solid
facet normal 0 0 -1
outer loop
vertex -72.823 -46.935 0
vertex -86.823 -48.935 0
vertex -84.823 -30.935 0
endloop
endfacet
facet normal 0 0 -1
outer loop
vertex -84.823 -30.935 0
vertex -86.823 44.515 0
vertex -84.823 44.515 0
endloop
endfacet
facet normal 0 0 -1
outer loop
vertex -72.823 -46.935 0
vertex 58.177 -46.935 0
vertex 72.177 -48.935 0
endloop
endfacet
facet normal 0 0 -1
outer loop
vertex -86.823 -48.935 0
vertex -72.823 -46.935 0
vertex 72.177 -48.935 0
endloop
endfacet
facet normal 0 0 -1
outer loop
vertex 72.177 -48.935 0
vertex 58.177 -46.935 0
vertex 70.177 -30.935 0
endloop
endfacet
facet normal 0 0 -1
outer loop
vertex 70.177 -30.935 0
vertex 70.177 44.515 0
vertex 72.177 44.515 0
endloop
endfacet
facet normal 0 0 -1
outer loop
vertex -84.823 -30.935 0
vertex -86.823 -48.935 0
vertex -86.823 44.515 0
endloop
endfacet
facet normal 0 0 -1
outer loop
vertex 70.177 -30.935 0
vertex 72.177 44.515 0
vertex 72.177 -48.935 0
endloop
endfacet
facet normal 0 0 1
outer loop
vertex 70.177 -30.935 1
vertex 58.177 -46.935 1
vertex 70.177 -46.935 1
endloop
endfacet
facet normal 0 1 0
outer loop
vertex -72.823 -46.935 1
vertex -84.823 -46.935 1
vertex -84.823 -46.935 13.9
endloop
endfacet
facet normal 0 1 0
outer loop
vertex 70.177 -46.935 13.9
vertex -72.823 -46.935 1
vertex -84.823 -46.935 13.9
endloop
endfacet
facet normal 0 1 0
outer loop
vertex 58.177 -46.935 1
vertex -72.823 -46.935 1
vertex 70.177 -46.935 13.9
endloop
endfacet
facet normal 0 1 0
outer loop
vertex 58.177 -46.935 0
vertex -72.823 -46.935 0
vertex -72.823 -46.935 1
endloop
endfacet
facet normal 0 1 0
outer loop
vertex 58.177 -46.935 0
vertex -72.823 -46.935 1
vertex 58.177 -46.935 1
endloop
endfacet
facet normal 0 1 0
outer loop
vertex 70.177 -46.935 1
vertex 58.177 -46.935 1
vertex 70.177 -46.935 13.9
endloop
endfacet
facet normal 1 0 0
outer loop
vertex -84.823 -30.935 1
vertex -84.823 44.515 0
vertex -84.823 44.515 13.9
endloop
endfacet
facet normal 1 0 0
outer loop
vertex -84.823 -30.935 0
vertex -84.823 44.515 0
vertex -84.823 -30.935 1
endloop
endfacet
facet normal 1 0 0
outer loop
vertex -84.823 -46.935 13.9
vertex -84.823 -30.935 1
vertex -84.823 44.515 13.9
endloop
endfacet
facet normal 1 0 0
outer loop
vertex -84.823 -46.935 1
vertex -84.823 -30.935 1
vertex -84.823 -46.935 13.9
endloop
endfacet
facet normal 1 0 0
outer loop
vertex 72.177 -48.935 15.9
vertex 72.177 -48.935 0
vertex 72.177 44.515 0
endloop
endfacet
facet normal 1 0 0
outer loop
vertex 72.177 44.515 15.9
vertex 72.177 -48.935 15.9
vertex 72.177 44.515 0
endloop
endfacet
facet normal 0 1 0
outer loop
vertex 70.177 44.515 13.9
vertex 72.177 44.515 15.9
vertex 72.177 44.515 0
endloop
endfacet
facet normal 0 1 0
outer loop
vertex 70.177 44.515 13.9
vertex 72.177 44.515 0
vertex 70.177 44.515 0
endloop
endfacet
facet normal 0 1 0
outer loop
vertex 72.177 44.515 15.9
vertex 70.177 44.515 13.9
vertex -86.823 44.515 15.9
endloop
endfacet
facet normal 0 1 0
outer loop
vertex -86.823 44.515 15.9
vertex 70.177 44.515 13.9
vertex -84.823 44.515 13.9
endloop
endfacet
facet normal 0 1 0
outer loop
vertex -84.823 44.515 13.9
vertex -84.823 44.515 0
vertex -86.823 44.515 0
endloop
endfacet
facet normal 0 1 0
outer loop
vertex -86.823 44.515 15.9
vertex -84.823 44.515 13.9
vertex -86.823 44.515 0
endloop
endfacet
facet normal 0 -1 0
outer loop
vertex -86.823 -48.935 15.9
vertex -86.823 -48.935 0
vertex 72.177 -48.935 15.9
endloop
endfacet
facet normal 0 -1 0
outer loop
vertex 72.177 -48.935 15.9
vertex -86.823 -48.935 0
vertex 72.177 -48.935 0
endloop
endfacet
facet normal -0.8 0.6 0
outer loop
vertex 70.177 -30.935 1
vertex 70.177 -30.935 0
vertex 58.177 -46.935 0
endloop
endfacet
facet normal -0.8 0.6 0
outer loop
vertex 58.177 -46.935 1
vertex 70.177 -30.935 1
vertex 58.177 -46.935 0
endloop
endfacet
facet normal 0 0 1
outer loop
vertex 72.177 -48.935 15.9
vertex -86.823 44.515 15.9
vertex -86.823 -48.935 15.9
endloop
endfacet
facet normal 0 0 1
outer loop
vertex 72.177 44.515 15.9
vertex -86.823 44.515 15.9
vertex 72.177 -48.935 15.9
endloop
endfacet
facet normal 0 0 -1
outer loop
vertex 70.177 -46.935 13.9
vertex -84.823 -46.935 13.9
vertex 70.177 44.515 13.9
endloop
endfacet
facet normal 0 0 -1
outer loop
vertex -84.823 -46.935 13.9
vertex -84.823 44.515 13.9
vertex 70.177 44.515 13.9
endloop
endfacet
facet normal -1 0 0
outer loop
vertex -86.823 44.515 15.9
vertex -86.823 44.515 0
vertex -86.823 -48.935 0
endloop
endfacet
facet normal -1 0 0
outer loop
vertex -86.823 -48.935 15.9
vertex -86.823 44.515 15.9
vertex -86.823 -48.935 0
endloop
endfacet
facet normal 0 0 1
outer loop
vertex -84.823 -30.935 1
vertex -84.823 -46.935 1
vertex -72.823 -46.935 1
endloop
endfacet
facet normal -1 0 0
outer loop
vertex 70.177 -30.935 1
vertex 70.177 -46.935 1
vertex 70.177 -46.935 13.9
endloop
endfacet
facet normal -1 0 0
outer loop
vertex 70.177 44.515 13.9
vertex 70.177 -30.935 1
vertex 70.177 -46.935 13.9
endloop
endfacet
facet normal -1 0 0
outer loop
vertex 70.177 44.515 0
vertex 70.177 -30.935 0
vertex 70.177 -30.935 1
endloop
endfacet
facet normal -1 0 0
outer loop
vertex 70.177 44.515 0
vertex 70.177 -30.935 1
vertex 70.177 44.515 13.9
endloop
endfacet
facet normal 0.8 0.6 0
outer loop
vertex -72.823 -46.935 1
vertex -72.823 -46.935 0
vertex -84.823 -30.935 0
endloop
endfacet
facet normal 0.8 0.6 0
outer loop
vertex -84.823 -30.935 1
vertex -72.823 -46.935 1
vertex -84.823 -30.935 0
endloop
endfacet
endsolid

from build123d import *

# Parameters (mm, degrees)
F1_DEPTH = 15.9
F2_DEPTH = 13.9
F3_DEPTH = 1


with BuildPart() as f1:
    # F0 (on Top) → F1 (new body)
    with BuildSketch(Plane.XY):
        Polygon((-84.823024, -30.93472), (-84.823024, 44.51528), (-86.823024, 44.51528), (-86.823024, -48.93472), (72.176976, -48.93472), (72.176976, 44.51528), (70.176976, 44.51528), (70.176976, -30.93472), (70.176976, -46.93472), (58.176976, -46.93472), (-72.823024, -46.93472), (-84.823024, -46.93472), align=None)
        Polygon((-72.823024, -46.93472), (-84.823024, -30.93472), (-84.823024, -46.93472), align=None)
        Polygon((70.176976, -46.93472), (70.176976, -30.93472), (58.176976, -46.93472), align=None)
        Polygon((70.176976, 44.51528), (-84.823024, 44.51528), (-84.823024, -30.93472), (-72.823024, -46.93472), (58.176976, -46.93472), (70.176976, -30.93472), align=None)
    extrude(amount=F1_DEPTH)

    # F0 (on Top) → F2 (cut)
    with BuildSketch(Plane.XY):
        Polygon((-72.823024, -46.93472), (-84.823024, -30.93472), (-84.823024, -46.93472), align=None)
        Polygon((70.176976, 44.51528), (-84.823024, 44.51528), (-84.823024, -30.93472), (-72.823024, -46.93472), (58.176976, -46.93472), (70.176976, -30.93472), align=None)
        Polygon((70.176976, -46.93472), (70.176976, -30.93472), (58.176976, -46.93472), align=None)
    extrude(amount=F2_DEPTH, mode=Mode.SUBTRACT)

    # F0 (on Top) → F3 (join)
    with BuildSketch(Plane.XY):
        Polygon((-72.823024, -46.93472), (-84.823024, -30.93472), (-84.823024, -46.93472), align=None)
        Polygon((70.176976, -46.93472), (70.176976, -30.93472), (58.176976, -46.93472), align=None)
    extrude(amount=F3_DEPTH)


solid = f1.part
